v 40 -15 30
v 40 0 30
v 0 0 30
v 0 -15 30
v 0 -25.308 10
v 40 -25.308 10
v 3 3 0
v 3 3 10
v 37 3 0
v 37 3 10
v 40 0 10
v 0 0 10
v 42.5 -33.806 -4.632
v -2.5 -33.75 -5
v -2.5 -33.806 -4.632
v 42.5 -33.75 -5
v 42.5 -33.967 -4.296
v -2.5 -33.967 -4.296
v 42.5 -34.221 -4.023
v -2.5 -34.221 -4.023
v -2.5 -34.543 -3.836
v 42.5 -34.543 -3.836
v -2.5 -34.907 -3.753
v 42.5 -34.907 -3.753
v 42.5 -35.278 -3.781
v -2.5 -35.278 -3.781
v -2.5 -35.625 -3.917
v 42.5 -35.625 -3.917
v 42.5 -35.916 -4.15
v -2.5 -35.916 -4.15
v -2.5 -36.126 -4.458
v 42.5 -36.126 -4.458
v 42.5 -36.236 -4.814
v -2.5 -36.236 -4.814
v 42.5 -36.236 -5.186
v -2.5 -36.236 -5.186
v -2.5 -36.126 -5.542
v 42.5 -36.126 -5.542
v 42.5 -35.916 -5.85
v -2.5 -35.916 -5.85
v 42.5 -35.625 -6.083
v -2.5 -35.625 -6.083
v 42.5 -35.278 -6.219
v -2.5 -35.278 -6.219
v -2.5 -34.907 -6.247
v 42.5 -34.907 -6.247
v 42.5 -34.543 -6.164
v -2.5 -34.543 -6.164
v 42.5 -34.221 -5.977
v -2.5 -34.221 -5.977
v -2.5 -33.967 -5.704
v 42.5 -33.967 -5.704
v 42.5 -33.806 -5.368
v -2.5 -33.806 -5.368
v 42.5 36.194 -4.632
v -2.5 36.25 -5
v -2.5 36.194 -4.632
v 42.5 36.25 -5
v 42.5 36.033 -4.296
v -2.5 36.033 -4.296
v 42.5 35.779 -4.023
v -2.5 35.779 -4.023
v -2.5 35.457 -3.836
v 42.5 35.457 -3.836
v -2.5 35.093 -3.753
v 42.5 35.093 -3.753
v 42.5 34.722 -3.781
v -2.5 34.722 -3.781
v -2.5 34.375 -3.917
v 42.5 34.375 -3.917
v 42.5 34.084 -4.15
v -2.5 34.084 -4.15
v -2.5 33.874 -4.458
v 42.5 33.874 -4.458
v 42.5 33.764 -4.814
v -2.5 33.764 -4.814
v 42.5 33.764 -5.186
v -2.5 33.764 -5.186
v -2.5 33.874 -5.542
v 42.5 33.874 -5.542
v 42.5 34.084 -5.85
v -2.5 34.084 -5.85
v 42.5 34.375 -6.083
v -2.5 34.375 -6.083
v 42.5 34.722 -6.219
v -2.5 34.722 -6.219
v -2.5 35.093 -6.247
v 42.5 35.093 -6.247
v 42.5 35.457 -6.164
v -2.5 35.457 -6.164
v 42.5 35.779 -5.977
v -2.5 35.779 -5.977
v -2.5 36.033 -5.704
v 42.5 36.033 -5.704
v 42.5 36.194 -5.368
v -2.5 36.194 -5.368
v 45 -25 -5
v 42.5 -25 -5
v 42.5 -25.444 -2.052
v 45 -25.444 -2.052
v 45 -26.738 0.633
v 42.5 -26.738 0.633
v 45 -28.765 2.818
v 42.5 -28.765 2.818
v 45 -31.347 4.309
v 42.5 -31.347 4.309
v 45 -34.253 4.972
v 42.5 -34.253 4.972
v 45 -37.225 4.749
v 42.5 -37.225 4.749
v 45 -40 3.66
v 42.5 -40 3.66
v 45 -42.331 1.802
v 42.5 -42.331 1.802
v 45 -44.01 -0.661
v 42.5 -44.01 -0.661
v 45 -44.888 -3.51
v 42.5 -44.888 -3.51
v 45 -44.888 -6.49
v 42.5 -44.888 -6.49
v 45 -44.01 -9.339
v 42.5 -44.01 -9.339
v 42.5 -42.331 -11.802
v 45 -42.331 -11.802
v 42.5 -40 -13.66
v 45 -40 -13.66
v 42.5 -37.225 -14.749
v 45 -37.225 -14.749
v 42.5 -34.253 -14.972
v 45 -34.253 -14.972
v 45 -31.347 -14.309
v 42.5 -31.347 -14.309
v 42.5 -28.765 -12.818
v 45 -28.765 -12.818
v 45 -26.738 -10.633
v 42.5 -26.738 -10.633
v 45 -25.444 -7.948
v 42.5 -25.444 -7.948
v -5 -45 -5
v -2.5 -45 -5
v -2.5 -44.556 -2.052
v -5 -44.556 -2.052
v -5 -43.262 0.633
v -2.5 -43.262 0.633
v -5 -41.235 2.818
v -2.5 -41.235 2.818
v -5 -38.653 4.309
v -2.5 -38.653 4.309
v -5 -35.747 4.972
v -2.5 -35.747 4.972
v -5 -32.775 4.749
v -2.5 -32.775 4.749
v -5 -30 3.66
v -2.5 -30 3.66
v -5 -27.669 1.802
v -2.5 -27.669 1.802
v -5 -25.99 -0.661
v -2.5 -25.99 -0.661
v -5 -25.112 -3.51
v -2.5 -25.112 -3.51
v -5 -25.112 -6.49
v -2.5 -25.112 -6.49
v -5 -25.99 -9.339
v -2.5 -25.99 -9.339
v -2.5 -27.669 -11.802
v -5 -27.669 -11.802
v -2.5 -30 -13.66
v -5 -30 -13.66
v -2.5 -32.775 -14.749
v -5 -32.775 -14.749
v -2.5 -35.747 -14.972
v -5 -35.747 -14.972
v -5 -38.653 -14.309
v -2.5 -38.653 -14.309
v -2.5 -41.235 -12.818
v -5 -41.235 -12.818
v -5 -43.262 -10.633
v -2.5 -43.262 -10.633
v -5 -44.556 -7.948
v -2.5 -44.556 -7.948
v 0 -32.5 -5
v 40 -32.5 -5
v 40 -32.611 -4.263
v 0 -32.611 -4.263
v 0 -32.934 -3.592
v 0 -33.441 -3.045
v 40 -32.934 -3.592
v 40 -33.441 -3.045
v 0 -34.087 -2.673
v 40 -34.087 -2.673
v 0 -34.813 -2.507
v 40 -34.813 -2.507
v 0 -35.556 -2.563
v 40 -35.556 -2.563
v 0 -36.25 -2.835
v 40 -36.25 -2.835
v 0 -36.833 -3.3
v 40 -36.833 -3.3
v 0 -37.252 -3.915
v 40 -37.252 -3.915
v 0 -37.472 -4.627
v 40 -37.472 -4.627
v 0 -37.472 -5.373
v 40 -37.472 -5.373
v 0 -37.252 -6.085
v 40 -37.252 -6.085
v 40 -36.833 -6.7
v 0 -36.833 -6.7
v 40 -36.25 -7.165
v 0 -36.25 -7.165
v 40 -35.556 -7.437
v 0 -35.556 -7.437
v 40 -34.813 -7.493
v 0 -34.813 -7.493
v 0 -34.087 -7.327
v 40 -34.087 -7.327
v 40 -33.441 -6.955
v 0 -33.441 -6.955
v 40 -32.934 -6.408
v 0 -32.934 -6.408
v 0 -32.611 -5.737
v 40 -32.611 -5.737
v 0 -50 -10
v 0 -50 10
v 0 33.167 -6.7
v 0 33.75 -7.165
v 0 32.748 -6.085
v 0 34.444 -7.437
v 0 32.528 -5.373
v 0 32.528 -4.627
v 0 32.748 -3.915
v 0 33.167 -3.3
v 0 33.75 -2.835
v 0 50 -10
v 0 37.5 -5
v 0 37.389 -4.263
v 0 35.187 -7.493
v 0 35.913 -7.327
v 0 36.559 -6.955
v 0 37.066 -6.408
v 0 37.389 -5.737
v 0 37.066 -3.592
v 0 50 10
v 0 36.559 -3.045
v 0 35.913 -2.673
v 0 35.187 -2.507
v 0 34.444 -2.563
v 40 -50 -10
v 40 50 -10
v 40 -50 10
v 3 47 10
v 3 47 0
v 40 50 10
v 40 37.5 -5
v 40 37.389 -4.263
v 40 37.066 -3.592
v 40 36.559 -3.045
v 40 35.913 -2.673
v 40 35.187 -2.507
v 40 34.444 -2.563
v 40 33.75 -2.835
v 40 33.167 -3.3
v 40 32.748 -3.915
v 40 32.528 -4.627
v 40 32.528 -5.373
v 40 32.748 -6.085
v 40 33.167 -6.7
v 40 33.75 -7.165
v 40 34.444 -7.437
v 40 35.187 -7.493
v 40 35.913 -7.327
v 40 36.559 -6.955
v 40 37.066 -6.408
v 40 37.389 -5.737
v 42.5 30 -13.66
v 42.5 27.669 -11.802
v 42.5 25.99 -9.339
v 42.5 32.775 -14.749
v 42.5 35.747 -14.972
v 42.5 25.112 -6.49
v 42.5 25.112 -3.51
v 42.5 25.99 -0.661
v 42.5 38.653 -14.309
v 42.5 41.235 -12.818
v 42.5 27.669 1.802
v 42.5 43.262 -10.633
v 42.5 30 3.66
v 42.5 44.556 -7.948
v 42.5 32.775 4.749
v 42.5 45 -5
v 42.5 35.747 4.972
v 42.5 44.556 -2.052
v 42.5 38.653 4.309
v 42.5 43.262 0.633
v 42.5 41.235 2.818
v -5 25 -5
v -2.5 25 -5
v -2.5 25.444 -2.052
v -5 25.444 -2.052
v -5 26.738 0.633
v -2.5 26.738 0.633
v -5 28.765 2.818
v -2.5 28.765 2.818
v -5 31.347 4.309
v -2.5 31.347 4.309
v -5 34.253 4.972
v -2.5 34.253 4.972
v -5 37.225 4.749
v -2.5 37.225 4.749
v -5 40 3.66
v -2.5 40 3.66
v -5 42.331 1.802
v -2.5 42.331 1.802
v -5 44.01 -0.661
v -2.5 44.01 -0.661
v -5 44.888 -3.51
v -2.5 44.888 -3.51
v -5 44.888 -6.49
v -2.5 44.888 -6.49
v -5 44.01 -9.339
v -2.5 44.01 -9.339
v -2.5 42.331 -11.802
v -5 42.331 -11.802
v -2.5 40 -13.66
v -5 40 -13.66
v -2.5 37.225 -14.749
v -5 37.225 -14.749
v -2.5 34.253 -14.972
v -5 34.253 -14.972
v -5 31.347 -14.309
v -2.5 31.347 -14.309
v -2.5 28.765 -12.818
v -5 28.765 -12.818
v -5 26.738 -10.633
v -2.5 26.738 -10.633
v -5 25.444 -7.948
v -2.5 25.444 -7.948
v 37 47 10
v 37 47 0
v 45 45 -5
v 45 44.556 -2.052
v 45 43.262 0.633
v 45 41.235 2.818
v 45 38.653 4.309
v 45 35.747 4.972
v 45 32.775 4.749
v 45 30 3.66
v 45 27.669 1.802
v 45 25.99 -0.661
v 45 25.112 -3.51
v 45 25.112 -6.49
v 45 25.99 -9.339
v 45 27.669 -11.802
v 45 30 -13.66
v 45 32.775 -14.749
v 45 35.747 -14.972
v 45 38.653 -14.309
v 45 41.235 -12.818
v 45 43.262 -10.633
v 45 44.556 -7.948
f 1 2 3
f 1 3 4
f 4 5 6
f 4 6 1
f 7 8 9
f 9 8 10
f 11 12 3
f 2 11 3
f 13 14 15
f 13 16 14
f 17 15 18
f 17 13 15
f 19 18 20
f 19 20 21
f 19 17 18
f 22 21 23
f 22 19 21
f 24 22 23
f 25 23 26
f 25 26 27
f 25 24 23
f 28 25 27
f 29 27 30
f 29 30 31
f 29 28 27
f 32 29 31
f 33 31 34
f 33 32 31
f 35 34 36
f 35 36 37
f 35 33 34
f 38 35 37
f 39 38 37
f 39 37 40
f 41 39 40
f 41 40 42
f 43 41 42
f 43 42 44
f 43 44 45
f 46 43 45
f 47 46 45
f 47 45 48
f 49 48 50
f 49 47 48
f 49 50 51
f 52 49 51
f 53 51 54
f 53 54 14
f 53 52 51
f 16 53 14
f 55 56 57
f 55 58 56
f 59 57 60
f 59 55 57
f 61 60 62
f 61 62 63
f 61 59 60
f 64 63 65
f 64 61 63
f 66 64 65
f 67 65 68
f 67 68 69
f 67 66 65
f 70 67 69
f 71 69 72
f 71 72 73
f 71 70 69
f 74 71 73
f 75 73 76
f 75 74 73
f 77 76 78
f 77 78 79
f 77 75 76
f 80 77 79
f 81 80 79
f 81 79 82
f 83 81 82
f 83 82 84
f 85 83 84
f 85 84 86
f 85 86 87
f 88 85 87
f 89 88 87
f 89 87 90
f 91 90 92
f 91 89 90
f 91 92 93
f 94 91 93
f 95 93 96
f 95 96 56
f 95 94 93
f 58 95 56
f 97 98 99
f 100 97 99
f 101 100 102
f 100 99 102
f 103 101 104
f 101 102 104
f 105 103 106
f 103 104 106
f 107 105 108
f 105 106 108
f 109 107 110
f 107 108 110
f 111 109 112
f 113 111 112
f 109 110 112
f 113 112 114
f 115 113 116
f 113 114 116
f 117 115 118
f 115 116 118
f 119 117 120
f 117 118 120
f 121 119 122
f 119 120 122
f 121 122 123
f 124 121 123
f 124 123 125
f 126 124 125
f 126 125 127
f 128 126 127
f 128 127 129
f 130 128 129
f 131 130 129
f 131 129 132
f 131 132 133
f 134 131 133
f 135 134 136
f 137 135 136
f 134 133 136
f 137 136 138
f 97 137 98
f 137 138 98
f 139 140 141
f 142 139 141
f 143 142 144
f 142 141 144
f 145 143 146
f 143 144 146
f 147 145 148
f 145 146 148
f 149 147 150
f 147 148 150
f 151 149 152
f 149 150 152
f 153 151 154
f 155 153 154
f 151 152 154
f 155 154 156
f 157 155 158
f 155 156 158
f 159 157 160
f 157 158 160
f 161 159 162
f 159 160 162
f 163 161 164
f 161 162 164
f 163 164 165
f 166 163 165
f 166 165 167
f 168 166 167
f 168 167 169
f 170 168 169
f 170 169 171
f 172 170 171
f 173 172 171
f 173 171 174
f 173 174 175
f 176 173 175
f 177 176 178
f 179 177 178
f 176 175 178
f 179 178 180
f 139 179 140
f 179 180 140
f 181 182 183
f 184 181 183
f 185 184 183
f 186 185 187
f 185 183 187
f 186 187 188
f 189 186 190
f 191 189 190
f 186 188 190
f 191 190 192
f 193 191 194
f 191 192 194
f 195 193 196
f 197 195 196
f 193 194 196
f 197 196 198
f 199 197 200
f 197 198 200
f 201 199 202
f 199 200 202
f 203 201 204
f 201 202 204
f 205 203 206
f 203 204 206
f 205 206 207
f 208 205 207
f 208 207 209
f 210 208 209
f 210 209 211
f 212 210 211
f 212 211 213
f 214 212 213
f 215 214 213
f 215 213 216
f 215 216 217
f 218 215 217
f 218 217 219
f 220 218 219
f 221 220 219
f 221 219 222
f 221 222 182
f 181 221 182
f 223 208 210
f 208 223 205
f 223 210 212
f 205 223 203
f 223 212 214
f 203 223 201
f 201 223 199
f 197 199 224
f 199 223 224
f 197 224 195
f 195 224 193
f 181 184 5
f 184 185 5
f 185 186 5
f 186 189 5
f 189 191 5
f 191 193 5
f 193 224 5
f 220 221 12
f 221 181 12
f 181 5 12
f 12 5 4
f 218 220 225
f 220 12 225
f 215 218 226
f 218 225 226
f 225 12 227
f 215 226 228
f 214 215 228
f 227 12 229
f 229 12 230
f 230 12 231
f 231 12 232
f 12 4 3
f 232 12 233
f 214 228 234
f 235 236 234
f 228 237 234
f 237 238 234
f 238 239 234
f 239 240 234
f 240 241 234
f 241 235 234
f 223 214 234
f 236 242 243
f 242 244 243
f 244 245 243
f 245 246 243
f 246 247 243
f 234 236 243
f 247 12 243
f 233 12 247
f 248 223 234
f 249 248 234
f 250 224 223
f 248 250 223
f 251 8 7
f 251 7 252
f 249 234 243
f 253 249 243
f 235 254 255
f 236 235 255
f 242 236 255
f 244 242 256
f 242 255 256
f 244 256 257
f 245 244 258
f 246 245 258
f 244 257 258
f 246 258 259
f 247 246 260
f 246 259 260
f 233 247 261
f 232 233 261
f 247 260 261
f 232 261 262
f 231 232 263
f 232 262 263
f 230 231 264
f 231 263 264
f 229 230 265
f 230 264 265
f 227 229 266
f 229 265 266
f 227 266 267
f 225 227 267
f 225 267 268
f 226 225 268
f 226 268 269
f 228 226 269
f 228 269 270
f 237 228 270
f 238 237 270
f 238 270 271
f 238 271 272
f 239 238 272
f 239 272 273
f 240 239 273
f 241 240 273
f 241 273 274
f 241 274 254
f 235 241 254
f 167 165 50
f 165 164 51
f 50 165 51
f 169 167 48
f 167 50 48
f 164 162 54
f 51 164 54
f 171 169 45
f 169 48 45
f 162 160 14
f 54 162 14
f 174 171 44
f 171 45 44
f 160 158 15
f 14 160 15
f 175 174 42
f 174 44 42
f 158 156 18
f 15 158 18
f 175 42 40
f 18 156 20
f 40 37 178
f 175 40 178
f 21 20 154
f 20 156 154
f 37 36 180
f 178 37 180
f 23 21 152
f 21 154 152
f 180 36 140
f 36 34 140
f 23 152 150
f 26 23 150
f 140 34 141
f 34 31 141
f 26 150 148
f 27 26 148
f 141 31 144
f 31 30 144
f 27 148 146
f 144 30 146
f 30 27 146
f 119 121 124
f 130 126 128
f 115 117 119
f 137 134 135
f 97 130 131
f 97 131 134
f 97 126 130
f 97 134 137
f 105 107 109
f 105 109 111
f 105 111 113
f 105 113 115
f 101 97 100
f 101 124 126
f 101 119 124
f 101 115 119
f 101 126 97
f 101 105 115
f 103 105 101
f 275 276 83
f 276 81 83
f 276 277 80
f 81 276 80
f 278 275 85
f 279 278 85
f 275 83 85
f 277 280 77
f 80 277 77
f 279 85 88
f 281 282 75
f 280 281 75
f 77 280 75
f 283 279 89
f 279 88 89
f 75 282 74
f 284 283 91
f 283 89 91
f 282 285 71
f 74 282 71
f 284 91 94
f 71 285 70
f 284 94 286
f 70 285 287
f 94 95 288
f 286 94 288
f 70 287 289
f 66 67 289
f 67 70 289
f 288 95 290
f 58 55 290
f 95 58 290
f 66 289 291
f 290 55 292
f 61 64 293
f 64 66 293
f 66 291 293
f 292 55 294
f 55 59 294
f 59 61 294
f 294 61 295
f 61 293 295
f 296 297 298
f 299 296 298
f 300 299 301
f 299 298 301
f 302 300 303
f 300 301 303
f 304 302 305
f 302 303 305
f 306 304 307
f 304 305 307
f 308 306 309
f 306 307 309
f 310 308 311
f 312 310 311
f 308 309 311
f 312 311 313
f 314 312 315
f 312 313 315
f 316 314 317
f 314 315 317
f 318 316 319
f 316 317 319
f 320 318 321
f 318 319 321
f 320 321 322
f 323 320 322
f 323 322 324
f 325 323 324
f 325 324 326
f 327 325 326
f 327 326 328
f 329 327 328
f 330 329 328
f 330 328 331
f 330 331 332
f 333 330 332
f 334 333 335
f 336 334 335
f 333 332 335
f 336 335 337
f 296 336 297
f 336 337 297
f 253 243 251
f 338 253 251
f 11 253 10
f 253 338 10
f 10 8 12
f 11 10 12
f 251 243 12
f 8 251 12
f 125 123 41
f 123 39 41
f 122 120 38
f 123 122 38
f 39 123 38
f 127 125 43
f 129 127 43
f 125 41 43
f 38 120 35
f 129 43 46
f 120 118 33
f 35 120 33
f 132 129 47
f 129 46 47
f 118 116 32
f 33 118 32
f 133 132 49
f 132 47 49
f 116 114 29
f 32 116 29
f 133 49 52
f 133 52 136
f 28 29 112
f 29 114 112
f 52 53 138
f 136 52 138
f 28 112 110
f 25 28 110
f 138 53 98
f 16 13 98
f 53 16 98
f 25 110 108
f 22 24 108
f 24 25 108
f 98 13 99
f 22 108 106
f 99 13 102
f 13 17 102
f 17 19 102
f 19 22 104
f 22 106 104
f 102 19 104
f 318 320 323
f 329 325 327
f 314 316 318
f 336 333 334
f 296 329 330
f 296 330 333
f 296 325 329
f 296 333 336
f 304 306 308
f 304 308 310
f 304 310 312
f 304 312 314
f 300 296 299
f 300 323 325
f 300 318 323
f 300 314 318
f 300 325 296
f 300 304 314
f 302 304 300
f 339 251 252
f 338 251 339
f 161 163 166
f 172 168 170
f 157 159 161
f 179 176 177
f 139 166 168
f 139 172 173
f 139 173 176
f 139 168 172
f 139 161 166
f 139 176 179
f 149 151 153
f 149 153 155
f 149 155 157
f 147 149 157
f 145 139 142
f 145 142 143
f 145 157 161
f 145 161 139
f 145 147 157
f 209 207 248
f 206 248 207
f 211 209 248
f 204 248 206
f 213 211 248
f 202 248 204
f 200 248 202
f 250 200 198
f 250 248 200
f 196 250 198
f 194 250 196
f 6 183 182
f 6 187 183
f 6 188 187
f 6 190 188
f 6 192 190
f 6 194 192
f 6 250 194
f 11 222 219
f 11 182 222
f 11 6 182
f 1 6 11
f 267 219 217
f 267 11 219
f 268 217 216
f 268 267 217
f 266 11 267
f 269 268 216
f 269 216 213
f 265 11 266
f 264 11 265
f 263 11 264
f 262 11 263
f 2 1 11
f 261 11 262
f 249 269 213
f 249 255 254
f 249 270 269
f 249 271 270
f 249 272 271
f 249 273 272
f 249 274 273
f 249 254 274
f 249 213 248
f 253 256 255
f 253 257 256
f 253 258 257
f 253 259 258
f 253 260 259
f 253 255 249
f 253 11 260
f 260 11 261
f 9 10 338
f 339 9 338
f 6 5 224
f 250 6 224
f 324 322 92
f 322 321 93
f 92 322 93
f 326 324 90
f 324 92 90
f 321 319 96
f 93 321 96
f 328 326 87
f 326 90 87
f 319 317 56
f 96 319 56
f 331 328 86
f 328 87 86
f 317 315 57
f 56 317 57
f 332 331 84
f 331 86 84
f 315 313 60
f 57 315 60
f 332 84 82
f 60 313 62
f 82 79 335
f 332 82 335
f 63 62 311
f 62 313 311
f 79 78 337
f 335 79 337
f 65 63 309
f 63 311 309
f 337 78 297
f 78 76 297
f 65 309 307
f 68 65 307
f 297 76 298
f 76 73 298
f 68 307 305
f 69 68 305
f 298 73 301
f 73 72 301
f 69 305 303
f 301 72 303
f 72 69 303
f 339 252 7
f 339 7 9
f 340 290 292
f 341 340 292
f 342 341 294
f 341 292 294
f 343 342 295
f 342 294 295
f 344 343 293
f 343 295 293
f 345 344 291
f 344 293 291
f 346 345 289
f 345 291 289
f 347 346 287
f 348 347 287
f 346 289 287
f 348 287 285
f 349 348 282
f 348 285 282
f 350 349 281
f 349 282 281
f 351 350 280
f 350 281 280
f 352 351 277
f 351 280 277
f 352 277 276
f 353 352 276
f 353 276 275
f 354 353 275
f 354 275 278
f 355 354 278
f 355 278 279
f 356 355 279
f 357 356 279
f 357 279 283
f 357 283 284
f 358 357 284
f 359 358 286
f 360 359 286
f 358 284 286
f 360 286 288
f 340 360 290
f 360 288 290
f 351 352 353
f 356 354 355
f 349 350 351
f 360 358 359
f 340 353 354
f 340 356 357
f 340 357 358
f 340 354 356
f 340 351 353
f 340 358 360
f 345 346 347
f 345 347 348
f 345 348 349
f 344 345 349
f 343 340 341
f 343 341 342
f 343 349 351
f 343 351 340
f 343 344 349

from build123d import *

# Parameters (mm, degrees)
F0_W      = 15
F0_H      = 20
F1_DEPTH  = 40
F2_DEPTH  = 25
F3_DEPTH  = 40.001
F4_R      = 2.5
F5_DEPTH  = 40.001
F6_W      = 34
F6_H      = 44
F7_DEPTH  = 10
F8_R      = 1.25
F9_DEPTH  = 42.5
F10_DEPTH = 2.5
F11_DEPTH = 2.5
F12_R     = 10
F13_DEPTH = 2.5
F14_R     = 10
F15_DEPTH = 2.5
F16_R     = 10
F17_DEPTH = 2.5
F18_R     = 10
F19_DEPTH = 2.5


with BuildPart() as f1:
    # F0 (on Right) → F1 (new body)
    with BuildSketch(Plane.YZ):
        Polygon((50, -10), (50, 10), (0, 10), (-15, 10), (-25.30775, 10), (-50, 10), (-50, -10), align=None)
        with Locations((-7.5, 20)):
            Rectangle(F0_W, F0_H)
        Polygon((-25.30775, 10), (-15, 10), (-15, 30), align=None)
        Polygon((-25.30775, 30), (-25.30775, 10), (-15, 30), align=None)
    extrude(amount=F1_DEPTH)

    # F0 (on Right) + F1_face (on face) → F2 (join)
    with BuildSketch(Plane.YZ):
        Polygon((50, -10), (50, 10), (0, 10), (-15, 10), (-25.30775, 10), (-50, 10), (-50, -10), align=None)
        with Locations((-7.5, 20)):
            Rectangle(F0_W, F0_H)
        Polygon((-25.30775, 10), (-15, 10), (-15, 30), align=None)
        Polygon((-25.30775, 30), (-25.30775, 10), (-15, 30), align=None)
    with BuildSketch(Plane(origin=(0, -2.5556368623, 4.0392952551), x_dir=(0, 1, 0), z_dir=(-1, 0, 0))):
        Polygon((52.5556368623, -5.9607047449), (52.5556368623, 14.0392952551), (-47.4443631377, 14.0392952551), (-47.4443631377, -5.9607047449), (-22.7521131377, -5.9607047449), (-22.7521131377, -25.9607047449), (2.5556368623, -25.9607047449), (2.5556368623, -5.9607047449), align=None)
    extrude(amount=F2_DEPTH, dir=(1, 0, 0))

    # F0 (on Right) → F3 (cut, through all)
    with BuildSketch(Plane.YZ):
        Polygon((-25.30775, 30), (-25.30775, 10), (-15, 30), align=None)
    extrude(amount=F3_DEPTH, mode=Mode.SUBTRACT)

    # F4 (on face) → F5 (cut, through all)
    with BuildSketch(Plane.YZ.offset(40)):
        with Locations((-35, -5)):
            Circle(F4_R)
        with Locations((35, -5)):
            Circle(F4_R)
    extrude(amount=-F5_DEPTH, mode=Mode.SUBTRACT)

    # F6 (on face) → F7 (cut)
    with BuildSketch(Plane.XY.offset(10)):
        with Locations((20, 25)):
            Rectangle(F6_W, F6_H)
    extrude(amount=-F7_DEPTH, mode=Mode.SUBTRACT)


with BuildPart() as f9:
    # F8 (on Right) → F9 (new body)
    with BuildSketch(Plane.YZ):
        with Locations((35, -5)):
            Circle(F8_R)
    extrude(amount=F9_DEPTH)

    # F10 (add): a face of the model
    f10_faces = [f9.faces().sort_by_distance(p)[0] for p in [
        (0, 35, -5),
    ]]
    extrude(f10_faces, amount=F10_DEPTH)

    # F12 (on face) → F13 (join)
    with BuildSketch(Plane(origin=(-2.5, 0, 0), x_dir=(0, -1, 0), z_dir=(-1, 0, 0))):
        with Locations((-35, -5)):
            Circle(F12_R)
    extrude(amount=F13_DEPTH)

    # F18 (on face) → F19 (join)
    with BuildSketch(Plane.YZ.offset(42.5)):
        with Locations((35, -5)):
            Circle(F18_R)
    extrude(amount=F19_DEPTH)


with BuildPart() as f9b:
    # F8 (on Right) → F9, piece 2 (new body)
    with BuildSketch(Plane.YZ):
        with Locations((-35, -5)):
            Circle(F8_R)
    extrude(amount=F9_DEPTH)

    # F11 (add): a face of the model
    f11_faces = [f9b.faces().sort_by_distance(p)[0] for p in [
        (0, -35, -5),
    ]]
    extrude(f11_faces, amount=F11_DEPTH)

    # F14 (on face) → F15 (join)
    with BuildSketch(Plane(origin=(-2.5, 0, 0), x_dir=(0, -1, 0), z_dir=(-1, 0, 0))):
        with Locations((35, -5)):
            Circle(F14_R)
    extrude(amount=F15_DEPTH)

    # F16 (on face) → F17 (join)
    with BuildSketch(Plane.YZ.offset(42.5)):
        with Locations((-35, -5)):
            Circle(F16_R)
    extrude(amount=F17_DEPTH)


solid = Compound([f1.part, f9.part, f9b.part])
